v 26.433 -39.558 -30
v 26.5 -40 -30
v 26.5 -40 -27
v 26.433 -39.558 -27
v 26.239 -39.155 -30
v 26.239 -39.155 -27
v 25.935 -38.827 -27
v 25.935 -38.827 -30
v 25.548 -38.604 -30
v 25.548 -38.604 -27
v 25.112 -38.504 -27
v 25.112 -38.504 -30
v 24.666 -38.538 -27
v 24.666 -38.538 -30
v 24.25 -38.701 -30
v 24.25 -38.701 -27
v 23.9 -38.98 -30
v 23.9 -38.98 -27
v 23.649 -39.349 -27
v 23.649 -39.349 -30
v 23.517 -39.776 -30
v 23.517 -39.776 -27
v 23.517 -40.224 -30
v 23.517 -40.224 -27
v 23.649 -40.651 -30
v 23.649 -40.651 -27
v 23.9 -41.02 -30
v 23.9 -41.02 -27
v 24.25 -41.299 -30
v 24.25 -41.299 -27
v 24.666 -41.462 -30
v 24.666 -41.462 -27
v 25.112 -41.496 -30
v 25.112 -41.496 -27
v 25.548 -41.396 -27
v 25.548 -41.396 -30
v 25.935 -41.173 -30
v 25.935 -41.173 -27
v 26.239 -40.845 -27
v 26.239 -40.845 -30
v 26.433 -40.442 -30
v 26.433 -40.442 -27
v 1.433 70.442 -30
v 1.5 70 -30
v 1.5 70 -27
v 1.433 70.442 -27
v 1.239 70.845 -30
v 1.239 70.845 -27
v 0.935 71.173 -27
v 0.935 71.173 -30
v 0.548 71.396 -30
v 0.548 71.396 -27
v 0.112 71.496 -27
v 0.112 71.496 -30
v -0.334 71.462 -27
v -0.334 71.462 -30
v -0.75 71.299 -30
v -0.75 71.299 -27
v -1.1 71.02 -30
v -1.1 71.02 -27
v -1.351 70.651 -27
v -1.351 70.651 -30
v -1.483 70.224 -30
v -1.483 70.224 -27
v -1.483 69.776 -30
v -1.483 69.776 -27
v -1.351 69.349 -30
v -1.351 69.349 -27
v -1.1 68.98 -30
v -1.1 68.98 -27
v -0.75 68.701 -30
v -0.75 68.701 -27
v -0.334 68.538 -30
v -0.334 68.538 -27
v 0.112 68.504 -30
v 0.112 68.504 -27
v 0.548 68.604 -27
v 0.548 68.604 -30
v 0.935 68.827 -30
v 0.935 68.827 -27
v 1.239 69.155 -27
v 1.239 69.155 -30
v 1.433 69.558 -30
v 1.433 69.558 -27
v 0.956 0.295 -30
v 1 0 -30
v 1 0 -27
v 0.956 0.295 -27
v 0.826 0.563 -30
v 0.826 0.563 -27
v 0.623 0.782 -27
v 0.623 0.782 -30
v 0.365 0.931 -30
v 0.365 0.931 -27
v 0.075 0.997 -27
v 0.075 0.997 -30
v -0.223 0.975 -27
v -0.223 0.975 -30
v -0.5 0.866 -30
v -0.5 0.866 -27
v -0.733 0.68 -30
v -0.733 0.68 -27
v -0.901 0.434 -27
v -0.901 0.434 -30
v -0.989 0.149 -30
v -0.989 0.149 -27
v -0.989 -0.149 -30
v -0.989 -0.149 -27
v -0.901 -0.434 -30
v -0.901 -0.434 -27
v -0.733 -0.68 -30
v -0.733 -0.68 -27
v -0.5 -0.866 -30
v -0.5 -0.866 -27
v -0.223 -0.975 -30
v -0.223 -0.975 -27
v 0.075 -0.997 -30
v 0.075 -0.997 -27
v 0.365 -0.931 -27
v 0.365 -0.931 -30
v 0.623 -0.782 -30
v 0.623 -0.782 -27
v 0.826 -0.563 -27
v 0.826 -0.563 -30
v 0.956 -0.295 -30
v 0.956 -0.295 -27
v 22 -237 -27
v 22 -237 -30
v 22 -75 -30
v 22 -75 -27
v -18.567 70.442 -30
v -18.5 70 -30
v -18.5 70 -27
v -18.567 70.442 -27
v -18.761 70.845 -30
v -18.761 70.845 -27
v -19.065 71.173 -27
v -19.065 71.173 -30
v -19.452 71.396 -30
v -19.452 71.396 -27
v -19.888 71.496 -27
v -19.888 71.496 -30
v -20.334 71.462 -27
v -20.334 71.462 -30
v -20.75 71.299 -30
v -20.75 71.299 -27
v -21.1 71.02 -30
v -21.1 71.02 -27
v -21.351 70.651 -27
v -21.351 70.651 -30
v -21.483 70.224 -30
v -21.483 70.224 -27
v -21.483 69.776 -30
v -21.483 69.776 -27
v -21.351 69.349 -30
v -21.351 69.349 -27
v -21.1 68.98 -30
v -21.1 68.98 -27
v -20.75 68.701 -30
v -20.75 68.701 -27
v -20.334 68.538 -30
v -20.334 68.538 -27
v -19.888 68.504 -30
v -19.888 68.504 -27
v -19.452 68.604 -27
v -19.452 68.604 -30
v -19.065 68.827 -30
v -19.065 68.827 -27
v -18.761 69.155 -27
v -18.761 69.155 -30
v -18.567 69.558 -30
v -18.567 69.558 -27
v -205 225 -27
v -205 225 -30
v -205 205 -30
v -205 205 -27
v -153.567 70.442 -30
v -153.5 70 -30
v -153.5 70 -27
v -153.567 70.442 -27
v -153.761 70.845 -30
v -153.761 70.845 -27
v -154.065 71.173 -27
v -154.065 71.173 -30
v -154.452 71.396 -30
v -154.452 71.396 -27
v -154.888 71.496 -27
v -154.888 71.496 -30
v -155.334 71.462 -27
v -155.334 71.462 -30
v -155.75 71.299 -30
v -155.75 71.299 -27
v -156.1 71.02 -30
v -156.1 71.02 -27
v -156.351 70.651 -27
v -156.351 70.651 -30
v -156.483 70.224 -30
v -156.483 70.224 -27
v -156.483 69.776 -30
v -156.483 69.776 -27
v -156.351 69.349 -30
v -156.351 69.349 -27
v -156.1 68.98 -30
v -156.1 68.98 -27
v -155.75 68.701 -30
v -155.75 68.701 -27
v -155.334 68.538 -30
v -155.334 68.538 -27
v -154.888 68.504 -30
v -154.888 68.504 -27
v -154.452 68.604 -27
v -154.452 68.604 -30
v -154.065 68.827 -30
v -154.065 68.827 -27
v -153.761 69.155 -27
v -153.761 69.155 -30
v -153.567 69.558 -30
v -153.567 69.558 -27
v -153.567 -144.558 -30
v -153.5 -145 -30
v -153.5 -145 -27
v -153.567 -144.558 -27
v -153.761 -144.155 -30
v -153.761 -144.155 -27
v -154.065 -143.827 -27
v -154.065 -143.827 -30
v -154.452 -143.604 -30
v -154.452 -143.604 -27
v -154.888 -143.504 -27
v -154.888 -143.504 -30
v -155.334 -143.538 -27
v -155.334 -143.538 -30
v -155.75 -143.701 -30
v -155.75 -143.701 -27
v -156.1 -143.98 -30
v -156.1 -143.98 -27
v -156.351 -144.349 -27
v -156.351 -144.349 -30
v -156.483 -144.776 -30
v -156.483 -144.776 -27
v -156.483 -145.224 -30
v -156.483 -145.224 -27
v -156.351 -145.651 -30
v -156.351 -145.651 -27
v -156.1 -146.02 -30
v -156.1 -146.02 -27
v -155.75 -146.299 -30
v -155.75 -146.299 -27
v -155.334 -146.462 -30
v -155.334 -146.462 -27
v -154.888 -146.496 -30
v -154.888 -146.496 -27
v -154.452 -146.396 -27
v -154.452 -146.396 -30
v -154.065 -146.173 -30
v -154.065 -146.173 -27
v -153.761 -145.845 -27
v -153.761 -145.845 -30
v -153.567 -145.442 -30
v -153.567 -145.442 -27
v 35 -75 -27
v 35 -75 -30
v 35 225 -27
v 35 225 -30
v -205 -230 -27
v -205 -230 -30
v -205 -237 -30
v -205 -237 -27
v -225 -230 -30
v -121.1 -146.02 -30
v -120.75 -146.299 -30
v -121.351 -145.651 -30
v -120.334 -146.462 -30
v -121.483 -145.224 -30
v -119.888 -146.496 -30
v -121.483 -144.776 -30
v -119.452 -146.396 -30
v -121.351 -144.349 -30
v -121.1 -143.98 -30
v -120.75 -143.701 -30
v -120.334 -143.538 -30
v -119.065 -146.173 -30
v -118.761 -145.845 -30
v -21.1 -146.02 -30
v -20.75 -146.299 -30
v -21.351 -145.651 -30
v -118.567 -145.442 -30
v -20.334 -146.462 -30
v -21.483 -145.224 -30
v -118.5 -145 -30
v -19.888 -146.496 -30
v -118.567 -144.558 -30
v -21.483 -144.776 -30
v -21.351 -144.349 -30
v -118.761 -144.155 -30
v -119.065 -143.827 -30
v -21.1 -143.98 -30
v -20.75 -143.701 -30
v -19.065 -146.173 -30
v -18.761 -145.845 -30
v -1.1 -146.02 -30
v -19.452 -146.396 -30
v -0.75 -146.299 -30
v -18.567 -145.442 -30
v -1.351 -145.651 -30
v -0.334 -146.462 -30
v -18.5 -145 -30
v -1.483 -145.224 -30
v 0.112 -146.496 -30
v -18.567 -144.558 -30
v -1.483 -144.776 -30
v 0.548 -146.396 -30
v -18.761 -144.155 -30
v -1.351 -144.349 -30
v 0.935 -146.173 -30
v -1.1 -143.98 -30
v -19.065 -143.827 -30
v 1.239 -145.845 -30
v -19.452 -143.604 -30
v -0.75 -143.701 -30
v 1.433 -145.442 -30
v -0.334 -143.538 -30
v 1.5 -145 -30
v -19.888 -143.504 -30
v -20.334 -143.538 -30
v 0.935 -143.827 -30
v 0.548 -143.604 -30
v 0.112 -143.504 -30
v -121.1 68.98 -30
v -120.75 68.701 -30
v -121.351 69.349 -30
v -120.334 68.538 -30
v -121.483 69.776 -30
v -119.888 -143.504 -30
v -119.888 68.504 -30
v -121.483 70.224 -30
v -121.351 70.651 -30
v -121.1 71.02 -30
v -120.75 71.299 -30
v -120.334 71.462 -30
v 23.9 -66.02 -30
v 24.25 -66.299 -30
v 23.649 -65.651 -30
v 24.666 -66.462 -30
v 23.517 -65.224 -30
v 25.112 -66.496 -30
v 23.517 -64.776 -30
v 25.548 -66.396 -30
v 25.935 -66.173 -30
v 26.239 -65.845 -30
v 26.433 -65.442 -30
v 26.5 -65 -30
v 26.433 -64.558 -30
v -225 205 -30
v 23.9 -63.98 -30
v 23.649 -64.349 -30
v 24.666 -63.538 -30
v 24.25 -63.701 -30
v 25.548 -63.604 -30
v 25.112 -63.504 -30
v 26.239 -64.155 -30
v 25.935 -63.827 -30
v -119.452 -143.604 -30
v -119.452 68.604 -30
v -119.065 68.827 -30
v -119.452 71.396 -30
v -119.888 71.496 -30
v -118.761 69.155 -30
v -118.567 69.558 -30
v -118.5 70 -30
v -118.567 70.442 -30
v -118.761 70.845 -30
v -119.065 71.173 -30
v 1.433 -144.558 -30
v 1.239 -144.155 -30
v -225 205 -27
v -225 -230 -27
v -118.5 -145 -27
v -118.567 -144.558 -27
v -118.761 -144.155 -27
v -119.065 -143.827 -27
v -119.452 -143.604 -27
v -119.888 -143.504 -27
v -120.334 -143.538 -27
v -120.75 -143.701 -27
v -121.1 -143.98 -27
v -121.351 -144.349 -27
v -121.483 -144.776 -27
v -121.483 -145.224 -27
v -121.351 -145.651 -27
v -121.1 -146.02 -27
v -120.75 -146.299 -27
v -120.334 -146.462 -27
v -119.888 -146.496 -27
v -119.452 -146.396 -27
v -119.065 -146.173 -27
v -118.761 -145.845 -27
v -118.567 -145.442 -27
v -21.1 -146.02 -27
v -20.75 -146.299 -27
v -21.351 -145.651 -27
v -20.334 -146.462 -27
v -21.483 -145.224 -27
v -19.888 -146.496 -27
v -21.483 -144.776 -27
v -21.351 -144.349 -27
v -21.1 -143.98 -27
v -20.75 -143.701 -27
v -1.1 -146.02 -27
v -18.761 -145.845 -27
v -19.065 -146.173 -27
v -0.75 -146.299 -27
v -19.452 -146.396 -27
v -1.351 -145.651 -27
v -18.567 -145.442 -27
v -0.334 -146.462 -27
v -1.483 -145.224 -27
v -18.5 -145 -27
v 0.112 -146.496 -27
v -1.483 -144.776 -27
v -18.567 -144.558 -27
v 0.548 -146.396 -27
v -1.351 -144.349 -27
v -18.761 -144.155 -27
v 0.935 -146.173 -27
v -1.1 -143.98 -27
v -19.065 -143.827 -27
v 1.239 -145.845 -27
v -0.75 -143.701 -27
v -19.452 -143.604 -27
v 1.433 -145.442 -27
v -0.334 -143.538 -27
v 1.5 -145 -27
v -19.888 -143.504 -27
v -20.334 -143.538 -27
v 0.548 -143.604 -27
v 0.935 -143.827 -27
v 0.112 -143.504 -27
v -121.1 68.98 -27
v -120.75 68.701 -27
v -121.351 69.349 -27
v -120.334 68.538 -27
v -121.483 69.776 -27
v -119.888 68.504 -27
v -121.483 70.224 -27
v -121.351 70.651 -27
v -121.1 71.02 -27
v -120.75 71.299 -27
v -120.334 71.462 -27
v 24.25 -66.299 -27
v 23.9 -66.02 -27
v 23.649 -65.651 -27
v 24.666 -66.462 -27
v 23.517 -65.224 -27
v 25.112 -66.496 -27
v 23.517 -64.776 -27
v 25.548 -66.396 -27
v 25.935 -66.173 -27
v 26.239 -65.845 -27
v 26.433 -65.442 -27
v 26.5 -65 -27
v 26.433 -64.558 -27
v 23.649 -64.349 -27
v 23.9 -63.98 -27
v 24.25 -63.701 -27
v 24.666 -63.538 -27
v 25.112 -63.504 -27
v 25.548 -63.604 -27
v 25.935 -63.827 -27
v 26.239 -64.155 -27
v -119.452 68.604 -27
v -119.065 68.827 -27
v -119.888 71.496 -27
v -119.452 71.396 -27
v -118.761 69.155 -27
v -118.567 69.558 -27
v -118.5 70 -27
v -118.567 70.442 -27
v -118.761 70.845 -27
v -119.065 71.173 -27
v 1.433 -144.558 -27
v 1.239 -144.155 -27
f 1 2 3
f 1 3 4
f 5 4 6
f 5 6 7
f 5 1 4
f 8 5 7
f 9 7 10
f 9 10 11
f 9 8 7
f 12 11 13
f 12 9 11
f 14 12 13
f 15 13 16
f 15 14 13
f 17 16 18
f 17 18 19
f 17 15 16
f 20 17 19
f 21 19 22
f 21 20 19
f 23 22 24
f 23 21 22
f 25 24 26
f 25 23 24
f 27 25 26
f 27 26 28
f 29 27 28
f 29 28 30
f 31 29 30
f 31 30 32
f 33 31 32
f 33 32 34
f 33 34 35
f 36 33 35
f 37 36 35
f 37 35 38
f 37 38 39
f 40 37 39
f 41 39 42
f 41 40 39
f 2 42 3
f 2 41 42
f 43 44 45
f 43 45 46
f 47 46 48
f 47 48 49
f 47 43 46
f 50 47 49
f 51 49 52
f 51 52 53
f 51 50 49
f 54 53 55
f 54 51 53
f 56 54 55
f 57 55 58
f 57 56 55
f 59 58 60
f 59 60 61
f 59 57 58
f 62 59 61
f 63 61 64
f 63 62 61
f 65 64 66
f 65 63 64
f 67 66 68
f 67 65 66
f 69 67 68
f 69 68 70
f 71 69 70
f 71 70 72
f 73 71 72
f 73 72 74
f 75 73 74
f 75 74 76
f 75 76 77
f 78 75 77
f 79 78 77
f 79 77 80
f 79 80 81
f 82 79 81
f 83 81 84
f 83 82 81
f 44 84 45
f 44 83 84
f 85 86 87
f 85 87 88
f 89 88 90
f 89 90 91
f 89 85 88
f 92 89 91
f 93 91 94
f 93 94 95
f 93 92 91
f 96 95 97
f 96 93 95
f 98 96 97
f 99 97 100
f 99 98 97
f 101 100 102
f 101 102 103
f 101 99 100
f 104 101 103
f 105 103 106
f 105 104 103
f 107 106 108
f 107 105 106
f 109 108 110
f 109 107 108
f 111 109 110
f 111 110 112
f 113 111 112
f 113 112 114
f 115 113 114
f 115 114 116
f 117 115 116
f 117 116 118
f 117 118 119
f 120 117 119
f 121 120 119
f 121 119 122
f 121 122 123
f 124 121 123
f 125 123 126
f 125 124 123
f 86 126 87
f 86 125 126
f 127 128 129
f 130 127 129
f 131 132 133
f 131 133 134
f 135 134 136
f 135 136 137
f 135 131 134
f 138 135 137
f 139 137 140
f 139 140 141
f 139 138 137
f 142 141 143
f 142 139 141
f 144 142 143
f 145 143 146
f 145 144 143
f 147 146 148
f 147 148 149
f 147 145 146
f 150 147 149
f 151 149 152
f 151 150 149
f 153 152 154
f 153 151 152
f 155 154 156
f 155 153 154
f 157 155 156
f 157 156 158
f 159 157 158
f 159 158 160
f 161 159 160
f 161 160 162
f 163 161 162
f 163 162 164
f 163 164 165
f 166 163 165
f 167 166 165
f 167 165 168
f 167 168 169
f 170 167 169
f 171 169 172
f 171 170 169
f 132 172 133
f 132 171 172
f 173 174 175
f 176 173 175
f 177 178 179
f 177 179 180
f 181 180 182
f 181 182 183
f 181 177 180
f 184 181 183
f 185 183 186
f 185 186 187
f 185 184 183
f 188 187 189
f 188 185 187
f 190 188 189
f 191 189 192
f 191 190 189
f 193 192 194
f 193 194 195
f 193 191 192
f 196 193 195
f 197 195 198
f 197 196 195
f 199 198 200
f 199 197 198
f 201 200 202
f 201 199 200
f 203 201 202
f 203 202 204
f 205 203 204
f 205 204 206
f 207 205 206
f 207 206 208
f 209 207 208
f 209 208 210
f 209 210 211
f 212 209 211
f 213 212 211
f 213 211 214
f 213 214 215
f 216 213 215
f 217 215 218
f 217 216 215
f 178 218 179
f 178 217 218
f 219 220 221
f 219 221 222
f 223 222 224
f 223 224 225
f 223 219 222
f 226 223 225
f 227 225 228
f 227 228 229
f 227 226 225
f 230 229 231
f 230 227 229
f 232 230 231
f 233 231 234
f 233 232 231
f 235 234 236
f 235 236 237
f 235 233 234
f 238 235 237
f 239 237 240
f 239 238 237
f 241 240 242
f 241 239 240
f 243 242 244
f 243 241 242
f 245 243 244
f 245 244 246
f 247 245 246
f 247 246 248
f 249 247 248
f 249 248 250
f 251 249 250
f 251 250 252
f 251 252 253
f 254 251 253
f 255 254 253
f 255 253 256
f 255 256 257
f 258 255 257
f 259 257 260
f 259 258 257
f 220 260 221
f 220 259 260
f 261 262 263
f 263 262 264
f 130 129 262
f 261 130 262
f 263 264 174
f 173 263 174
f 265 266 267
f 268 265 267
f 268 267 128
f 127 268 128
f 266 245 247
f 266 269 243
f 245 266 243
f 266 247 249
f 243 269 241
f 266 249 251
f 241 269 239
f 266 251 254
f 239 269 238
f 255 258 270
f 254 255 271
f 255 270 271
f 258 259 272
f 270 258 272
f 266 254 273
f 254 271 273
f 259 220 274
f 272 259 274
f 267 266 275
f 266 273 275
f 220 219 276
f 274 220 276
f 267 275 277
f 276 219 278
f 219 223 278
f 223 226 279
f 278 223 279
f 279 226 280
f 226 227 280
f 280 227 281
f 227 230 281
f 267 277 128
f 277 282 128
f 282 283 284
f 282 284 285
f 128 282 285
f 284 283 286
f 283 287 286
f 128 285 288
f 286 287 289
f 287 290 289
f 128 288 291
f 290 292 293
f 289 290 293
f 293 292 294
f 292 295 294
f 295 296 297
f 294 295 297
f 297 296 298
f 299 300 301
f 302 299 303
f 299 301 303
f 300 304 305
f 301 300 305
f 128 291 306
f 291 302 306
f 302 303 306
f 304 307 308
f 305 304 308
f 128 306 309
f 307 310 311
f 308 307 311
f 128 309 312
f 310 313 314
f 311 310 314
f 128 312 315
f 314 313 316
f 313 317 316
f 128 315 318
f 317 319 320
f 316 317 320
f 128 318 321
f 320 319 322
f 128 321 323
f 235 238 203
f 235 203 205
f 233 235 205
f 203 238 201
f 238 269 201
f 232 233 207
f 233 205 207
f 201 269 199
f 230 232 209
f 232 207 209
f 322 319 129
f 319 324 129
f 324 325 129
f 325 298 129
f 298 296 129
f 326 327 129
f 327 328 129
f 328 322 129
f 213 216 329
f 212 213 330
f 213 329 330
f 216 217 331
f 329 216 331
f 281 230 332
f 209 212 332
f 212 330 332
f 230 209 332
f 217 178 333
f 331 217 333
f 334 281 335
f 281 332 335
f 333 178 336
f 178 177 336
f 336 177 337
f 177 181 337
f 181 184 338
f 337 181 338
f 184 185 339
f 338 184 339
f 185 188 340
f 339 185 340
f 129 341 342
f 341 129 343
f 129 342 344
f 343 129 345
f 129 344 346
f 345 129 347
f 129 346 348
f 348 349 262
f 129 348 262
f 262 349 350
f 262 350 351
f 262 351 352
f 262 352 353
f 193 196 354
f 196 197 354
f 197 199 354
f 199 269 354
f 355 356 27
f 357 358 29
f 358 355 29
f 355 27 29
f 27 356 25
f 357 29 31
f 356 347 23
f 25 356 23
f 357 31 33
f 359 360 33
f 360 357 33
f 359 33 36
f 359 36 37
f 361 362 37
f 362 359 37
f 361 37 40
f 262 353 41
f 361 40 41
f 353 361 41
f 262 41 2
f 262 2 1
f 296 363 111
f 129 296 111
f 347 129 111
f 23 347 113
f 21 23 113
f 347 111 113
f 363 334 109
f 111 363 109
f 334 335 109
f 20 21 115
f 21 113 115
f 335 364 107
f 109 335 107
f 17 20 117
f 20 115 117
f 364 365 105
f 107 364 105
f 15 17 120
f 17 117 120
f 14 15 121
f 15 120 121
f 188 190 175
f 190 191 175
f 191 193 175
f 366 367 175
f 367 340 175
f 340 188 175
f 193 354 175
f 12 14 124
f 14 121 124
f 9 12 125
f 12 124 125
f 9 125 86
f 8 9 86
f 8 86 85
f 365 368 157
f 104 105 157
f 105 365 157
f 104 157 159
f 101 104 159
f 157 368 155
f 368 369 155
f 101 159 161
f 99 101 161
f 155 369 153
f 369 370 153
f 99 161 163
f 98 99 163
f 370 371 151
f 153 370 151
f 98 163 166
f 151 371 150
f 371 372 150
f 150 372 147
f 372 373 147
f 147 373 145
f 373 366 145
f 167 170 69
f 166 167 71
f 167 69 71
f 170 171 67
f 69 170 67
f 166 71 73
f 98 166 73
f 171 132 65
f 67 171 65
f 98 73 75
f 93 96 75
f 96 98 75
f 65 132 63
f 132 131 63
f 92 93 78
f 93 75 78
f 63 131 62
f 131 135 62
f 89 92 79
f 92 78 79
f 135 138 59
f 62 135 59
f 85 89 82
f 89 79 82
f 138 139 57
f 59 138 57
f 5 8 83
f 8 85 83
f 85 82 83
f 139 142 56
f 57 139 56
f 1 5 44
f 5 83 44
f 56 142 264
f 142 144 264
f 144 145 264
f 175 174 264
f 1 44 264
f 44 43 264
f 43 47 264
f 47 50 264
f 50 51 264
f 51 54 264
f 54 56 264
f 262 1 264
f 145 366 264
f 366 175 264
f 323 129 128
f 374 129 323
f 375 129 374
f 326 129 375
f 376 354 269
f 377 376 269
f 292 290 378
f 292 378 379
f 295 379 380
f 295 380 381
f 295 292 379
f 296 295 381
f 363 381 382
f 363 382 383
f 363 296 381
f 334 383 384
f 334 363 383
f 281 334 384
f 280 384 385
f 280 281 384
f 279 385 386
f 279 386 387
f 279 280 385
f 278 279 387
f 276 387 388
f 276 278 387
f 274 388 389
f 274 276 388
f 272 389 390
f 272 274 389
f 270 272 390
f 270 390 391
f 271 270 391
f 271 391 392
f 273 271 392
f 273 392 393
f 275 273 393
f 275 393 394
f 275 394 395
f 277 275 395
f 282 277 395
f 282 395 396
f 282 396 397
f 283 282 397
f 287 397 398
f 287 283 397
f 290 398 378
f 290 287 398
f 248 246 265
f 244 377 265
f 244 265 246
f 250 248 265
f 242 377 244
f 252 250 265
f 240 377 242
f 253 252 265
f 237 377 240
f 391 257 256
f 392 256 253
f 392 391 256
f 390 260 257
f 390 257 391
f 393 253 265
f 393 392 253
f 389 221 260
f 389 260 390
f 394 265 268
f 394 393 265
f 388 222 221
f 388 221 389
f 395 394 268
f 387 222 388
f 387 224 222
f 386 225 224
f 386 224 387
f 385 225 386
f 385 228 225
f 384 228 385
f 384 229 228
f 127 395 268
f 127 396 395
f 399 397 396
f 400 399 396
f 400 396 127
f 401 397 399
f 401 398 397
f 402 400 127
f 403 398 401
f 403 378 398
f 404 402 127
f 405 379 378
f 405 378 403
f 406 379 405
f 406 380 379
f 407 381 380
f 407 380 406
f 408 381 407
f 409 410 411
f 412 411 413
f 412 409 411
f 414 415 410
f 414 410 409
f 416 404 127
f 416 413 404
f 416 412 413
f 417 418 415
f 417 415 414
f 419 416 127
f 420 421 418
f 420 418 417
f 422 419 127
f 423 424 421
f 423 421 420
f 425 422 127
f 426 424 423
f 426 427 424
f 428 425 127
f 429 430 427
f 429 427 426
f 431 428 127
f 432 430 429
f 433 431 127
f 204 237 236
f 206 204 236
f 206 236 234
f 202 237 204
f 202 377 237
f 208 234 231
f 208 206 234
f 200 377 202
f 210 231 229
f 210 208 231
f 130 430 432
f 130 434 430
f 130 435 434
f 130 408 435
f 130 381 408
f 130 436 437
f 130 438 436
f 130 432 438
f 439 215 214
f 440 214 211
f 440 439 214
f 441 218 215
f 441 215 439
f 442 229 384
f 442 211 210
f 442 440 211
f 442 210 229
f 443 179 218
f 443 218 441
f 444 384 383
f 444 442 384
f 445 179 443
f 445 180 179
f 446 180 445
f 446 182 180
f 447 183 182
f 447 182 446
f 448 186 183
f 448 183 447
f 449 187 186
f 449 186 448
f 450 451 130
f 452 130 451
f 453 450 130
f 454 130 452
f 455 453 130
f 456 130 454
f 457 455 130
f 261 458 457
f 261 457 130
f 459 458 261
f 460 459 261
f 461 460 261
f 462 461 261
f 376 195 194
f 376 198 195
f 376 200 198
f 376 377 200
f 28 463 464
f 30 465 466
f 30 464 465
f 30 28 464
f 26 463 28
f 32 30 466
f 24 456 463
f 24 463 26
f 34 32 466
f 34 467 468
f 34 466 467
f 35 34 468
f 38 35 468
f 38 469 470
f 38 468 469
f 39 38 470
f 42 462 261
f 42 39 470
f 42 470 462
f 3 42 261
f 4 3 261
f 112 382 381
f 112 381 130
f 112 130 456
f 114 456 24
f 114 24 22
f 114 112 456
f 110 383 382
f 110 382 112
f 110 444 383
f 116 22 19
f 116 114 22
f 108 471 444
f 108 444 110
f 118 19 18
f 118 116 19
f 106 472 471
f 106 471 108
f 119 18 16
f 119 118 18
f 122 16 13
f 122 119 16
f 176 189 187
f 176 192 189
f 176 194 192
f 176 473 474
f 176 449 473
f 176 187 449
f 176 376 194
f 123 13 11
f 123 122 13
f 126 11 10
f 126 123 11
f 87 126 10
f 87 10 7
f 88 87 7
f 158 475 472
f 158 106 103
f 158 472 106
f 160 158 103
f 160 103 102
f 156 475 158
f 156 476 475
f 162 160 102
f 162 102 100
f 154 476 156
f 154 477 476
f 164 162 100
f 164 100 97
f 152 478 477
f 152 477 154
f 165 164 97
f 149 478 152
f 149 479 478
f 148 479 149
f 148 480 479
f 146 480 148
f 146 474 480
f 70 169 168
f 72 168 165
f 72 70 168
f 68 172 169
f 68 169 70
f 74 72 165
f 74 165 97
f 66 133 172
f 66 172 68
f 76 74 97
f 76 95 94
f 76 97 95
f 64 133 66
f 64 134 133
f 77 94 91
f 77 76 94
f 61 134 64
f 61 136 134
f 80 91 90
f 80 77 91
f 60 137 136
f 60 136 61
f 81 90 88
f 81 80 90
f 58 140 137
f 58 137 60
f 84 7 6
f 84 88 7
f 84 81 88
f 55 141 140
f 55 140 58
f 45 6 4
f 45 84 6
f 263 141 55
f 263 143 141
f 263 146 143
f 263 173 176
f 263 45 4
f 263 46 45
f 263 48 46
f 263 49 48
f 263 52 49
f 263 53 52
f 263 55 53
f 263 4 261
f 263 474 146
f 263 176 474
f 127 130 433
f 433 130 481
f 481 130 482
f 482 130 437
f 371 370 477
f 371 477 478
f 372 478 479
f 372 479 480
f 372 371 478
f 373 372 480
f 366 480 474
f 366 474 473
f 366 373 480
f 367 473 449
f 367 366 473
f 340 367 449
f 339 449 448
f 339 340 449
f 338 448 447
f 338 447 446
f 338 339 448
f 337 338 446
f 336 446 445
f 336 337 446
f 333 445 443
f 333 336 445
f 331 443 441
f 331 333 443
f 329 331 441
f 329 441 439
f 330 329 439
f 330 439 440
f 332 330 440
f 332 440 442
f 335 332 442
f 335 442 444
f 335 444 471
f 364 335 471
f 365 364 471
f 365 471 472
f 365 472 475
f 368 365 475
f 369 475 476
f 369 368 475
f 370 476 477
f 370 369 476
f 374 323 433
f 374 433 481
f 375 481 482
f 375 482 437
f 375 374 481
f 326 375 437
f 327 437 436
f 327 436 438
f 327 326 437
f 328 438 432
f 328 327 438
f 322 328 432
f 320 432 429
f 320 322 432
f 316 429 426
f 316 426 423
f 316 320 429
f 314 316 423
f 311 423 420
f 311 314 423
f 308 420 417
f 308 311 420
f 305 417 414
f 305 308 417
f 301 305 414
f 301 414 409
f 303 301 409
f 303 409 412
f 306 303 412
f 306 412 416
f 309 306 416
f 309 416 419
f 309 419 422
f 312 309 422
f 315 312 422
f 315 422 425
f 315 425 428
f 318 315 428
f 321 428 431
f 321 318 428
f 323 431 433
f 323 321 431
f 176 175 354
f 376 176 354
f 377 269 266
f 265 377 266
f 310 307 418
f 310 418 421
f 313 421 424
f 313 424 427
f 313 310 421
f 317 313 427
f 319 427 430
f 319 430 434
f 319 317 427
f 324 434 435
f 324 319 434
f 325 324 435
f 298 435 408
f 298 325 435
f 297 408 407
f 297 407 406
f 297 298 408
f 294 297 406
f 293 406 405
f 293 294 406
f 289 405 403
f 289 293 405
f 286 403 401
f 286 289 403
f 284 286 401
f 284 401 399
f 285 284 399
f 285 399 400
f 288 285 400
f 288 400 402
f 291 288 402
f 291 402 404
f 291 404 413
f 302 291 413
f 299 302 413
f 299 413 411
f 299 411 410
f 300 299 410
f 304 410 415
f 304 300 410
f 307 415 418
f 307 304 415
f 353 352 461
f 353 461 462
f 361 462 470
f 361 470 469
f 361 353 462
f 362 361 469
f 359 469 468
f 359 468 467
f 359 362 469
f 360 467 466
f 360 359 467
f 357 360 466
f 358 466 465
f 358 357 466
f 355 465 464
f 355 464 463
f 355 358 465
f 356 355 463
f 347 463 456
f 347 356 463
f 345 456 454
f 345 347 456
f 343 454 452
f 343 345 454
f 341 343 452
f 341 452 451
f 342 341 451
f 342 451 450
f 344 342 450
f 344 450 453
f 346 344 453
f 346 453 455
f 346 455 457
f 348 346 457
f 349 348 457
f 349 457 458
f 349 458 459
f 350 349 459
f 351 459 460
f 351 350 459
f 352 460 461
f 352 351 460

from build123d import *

# Parameters (mm, degrees)
SKETCH020_R   = 1.5
SKETCH020_R_2 = 1
PAD034_DEPTH  = 3


with BuildPart() as part:
    # Sketch020 → Pad034 (new body)
    with BuildSketch(Plane.XY):
        Polygon((-205, -237), (22, -237), (22, -75), (35, -75), (35, 225), (-205, 225), (-205, 205), (-225, 205), (-225, -230), (-205, -230), align=None)
        with Locations((-155, 70)):
            Circle(SKETCH020_R, mode=Mode.SUBTRACT)
        with Locations((-120, 70)):
            Circle(SKETCH020_R, mode=Mode.SUBTRACT)
        with Locations((25, -40)):
            Circle(SKETCH020_R, mode=Mode.SUBTRACT)
        with Locations((25, -65)):
            Circle(SKETCH020_R, mode=Mode.SUBTRACT)
        with Locations((-120, -145)):
            Circle(SKETCH020_R, mode=Mode.SUBTRACT)
        with Locations((-155, -145)):
            Circle(SKETCH020_R, mode=Mode.SUBTRACT)
        Circle(SKETCH020_R_2, mode=Mode.SUBTRACT)
        with Locations((-20, 70)):
            Circle(SKETCH020_R, mode=Mode.SUBTRACT)
        with Locations((0, 70)):
            Circle(SKETCH020_R, mode=Mode.SUBTRACT)
        with Locations((-20, -145)):
            Circle(SKETCH020_R, mode=Mode.SUBTRACT)
        with Locations((0, -145)):
            Circle(SKETCH020_R, mode=Mode.SUBTRACT)
    extrude(amount=PAD034_DEPTH)


with BuildPart() as part_1:
    # Body035 placement: moved
    add(part.part.moved(Location((0, 0, -30))))


solid = part_1.part
